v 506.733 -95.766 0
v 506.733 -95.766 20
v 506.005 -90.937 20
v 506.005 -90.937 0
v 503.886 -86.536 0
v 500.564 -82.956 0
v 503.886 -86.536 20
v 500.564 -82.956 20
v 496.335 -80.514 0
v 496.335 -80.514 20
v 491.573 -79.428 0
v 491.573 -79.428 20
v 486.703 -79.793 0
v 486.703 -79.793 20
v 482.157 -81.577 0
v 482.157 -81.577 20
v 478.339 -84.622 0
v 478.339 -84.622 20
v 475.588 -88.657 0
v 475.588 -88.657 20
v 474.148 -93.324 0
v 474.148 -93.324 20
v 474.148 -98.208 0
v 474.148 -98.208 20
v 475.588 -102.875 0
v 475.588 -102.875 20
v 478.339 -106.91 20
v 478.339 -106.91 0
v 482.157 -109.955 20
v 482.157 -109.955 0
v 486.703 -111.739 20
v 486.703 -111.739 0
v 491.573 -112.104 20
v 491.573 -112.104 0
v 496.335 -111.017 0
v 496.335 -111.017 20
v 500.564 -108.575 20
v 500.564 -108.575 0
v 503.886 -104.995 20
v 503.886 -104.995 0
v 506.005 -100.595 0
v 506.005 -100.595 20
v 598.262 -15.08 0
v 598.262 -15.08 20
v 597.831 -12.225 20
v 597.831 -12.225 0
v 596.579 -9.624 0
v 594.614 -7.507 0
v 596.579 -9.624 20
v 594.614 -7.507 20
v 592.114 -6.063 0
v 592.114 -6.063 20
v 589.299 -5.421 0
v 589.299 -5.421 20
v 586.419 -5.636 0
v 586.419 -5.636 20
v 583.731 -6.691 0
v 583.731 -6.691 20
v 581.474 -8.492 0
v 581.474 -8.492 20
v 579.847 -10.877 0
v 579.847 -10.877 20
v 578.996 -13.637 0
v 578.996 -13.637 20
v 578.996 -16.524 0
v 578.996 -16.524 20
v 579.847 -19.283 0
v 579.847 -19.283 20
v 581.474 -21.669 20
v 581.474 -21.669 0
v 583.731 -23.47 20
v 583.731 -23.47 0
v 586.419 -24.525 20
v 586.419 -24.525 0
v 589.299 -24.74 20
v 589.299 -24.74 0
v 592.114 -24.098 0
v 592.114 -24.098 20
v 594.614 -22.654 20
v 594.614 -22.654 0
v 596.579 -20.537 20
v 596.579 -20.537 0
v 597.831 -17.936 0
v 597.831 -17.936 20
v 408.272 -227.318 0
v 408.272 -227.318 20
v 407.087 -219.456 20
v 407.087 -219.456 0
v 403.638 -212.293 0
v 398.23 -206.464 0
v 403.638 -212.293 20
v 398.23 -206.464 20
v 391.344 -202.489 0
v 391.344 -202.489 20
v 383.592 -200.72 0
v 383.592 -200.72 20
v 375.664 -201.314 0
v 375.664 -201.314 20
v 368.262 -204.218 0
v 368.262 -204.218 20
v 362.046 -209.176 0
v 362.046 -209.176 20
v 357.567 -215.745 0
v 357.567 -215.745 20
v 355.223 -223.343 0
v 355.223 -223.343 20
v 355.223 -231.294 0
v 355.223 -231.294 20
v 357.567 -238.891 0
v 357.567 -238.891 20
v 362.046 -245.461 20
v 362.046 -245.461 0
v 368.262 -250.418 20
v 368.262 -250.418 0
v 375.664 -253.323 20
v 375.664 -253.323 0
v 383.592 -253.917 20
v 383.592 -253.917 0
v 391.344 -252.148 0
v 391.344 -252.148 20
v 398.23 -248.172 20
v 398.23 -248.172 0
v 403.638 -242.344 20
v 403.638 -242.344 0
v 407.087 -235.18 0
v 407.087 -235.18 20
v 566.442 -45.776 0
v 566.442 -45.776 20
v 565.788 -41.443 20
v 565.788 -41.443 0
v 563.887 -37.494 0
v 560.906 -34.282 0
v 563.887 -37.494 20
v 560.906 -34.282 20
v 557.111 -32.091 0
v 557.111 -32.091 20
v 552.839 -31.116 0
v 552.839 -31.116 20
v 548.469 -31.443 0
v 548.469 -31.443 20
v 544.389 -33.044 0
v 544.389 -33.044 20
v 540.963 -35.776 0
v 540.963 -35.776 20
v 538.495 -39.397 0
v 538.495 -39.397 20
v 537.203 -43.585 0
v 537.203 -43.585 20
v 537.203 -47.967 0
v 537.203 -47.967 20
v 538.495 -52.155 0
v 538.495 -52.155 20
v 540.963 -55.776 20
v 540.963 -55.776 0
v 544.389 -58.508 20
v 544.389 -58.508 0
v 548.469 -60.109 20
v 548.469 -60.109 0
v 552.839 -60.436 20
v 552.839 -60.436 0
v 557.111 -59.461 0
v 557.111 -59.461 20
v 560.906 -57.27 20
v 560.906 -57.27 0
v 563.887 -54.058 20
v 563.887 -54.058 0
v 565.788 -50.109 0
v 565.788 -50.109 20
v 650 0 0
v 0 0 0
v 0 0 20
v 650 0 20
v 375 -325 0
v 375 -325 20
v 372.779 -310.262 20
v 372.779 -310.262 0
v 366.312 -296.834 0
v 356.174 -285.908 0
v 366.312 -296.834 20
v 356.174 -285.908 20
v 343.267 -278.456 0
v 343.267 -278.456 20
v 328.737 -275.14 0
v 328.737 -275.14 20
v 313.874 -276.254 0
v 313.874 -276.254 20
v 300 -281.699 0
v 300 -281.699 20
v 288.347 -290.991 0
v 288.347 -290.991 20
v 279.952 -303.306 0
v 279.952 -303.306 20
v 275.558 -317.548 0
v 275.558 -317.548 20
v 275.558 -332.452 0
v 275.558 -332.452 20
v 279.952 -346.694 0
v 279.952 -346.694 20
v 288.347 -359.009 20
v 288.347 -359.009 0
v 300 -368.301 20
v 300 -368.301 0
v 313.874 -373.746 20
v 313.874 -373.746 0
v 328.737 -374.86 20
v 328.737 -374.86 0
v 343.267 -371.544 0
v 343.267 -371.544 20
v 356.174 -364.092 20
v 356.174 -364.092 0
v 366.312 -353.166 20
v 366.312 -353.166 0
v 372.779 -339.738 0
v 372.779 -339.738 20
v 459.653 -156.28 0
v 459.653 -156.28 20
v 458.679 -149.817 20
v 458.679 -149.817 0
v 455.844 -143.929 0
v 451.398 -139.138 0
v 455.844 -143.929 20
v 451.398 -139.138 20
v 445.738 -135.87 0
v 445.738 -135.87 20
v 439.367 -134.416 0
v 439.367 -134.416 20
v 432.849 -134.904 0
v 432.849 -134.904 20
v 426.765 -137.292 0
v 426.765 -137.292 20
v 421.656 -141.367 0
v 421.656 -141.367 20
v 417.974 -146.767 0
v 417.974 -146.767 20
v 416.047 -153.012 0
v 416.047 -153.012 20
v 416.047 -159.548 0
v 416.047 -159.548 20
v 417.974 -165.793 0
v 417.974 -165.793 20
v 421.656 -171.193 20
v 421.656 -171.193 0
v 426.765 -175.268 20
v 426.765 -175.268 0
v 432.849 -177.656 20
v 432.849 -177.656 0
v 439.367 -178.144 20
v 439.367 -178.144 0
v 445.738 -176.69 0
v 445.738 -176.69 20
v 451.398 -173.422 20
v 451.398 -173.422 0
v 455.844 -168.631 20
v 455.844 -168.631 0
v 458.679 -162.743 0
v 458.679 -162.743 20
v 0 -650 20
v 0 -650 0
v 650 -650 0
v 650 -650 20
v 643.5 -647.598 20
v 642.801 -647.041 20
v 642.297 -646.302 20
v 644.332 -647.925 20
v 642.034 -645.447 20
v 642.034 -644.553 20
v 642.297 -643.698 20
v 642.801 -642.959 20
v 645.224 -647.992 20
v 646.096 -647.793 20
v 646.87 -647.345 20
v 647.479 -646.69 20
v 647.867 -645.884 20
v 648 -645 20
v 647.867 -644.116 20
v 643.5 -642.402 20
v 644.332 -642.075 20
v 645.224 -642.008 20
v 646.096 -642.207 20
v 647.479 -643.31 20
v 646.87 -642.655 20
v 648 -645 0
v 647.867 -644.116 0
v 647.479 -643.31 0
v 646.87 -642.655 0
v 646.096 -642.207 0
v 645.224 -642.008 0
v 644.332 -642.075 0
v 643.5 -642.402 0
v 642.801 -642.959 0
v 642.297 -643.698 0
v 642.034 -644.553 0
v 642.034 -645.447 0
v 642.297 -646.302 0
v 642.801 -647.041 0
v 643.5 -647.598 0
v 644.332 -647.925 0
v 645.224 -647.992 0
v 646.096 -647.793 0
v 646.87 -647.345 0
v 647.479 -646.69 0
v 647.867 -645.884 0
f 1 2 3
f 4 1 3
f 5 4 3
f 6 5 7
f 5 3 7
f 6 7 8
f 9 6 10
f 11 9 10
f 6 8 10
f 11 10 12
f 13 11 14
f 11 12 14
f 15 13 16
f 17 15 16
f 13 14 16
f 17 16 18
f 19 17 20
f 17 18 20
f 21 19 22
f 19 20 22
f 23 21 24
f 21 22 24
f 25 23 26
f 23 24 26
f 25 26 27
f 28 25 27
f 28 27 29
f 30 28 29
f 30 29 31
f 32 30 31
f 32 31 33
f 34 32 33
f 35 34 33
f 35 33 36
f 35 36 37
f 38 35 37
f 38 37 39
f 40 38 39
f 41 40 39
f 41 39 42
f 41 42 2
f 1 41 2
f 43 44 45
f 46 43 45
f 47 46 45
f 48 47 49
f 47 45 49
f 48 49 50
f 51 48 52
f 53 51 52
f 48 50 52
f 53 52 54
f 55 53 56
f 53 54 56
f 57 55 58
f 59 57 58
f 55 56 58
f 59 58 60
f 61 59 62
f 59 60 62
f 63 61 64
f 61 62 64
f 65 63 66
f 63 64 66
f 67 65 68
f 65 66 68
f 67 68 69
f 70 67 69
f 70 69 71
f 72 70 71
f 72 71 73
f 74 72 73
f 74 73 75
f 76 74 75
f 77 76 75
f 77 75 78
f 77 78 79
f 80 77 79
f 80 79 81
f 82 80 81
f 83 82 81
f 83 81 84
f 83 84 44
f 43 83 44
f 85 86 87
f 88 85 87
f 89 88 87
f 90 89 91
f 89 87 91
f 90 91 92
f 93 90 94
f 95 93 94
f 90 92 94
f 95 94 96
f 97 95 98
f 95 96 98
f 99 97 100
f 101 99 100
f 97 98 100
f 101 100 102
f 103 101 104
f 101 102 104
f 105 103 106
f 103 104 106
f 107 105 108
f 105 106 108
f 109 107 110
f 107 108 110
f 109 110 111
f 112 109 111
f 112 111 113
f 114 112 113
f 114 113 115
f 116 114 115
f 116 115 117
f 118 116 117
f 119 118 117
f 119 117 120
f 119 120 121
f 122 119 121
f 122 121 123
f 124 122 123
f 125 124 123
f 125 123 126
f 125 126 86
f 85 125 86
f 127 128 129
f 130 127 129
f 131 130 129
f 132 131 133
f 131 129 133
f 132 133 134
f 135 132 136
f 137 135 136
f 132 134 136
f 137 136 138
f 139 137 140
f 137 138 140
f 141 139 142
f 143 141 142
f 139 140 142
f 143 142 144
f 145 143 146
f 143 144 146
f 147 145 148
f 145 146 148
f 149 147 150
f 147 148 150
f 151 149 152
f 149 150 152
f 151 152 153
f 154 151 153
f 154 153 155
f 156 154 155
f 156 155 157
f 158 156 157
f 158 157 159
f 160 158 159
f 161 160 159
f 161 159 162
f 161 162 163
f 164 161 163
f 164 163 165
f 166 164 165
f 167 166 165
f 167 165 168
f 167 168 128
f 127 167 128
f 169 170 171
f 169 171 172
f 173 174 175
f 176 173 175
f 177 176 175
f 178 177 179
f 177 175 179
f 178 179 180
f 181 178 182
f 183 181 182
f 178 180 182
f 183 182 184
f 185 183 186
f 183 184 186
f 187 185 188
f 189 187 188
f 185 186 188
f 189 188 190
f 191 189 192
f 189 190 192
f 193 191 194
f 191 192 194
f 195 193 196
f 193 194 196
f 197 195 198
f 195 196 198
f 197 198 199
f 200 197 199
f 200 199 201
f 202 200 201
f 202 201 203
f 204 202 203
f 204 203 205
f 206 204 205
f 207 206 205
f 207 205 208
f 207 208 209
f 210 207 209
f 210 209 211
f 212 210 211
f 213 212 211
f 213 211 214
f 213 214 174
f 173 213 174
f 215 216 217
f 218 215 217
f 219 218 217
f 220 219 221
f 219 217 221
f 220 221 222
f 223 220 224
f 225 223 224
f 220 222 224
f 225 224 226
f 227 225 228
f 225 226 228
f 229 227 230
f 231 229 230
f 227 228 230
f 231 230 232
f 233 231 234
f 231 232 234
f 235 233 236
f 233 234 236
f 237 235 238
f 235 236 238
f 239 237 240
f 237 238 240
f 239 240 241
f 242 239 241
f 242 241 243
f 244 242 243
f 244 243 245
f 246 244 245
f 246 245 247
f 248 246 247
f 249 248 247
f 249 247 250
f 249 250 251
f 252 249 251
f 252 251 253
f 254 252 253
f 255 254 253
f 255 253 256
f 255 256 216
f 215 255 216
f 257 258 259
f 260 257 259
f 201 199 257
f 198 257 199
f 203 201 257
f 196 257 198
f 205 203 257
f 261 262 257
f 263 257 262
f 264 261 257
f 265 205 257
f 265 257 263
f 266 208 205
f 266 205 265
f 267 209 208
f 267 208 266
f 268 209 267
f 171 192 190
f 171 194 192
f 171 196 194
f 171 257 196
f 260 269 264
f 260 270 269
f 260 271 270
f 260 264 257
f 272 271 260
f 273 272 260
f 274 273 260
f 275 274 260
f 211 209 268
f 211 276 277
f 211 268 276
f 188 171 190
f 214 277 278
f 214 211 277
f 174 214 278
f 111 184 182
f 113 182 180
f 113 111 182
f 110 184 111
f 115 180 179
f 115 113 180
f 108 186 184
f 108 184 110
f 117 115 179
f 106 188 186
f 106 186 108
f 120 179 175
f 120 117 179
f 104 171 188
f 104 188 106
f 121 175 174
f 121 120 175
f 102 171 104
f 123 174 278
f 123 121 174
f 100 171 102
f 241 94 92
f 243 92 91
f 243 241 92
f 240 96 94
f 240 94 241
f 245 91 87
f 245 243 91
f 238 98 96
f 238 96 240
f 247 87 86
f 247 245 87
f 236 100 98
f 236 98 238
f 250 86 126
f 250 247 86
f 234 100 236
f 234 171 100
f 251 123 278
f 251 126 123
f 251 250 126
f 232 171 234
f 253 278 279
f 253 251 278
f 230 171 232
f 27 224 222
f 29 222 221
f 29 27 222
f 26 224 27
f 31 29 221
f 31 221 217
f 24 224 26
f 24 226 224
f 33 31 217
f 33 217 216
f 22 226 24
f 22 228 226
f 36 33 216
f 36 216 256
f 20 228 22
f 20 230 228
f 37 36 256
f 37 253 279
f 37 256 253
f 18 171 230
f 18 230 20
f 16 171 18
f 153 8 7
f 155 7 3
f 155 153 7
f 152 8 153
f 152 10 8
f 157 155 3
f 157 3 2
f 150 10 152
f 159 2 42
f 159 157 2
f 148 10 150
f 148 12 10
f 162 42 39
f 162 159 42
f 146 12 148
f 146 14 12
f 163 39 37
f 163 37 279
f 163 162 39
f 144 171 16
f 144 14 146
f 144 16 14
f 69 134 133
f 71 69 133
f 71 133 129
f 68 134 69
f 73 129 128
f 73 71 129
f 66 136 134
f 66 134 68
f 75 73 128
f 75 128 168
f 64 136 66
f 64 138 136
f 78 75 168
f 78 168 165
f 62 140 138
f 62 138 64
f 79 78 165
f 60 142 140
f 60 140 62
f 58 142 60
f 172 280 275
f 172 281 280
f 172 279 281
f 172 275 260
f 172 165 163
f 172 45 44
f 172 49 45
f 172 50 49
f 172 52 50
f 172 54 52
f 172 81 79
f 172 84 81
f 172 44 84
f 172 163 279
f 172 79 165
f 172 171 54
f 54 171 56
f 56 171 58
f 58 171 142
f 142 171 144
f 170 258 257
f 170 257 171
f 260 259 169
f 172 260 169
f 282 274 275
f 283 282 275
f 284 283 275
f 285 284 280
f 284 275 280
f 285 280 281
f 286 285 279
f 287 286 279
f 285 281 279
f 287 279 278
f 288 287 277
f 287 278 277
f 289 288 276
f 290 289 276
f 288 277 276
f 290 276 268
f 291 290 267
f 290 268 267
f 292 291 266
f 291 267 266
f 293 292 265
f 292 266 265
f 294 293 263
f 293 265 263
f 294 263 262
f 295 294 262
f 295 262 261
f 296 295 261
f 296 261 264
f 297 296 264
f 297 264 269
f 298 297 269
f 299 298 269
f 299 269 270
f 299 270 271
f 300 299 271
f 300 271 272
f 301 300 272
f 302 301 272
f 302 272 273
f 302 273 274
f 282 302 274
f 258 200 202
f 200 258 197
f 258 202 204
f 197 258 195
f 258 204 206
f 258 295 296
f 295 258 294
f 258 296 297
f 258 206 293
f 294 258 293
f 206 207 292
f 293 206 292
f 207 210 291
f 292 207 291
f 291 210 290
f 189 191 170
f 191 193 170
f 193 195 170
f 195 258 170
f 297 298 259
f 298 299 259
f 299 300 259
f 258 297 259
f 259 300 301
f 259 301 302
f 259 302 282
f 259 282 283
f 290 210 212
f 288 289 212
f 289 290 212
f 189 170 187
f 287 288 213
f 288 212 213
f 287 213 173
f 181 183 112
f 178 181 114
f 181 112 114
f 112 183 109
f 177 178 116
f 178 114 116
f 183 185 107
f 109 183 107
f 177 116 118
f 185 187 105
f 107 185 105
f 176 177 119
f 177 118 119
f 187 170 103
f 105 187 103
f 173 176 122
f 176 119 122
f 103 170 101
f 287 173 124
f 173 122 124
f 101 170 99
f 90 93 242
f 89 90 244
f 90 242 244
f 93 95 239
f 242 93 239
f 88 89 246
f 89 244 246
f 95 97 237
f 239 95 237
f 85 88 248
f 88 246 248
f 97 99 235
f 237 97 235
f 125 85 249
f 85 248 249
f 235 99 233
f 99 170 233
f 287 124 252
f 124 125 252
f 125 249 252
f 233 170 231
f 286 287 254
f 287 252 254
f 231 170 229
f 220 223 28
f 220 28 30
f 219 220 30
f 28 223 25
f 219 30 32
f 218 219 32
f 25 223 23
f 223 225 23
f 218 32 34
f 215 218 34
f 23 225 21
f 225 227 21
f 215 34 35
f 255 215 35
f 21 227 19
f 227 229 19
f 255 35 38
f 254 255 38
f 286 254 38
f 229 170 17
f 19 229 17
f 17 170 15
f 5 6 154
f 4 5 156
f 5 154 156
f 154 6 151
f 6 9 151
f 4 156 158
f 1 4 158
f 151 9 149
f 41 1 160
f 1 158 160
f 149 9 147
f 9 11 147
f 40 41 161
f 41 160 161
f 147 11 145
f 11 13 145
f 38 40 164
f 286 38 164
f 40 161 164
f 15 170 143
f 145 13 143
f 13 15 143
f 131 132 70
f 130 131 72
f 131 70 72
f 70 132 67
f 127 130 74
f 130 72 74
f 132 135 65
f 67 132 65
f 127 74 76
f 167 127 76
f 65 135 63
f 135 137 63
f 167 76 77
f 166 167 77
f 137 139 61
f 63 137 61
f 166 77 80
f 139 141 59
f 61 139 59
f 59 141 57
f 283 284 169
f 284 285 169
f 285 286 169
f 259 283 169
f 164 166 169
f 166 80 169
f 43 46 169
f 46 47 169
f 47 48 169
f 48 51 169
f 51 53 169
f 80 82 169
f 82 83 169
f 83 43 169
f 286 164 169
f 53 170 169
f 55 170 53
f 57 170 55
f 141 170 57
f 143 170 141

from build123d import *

# Parameters (mm, degrees)
F0_W       = 650
F0_H       = 650
F1_DEPTH   = 20
F2_R       = 50
F3_DEPTH   = 25
F4_R       = 26.673415
F9_DEPTH   = 25
F5_R       = 21.925408
F10_DEPTH  = 25
F6_R       = 16.384006
F11_DEPTH  = 25
F7_R       = 14.701481
F12_DEPTH  = 25
F8_R       = 9.686961
F13_DEPTH  = 25
F11_FACE_R = 16.384006
F14_DEPTH  = 50
F15_R      = 3
F16_DEPTH  = 25


with BuildPart() as f1:
    # F0 (on Top) → F1 (new body)
    with BuildSketch(Plane.XY):
        with Locations((325, -325)):
            Rectangle(F0_W, F0_H)
    extrude(amount=F1_DEPTH)

    # F2 (on face) → F3 (cut)
    with BuildSketch(Plane.XY.offset(20)):
        with Locations((325, -325)):
            Circle(F2_R)
    extrude(amount=-F3_DEPTH, mode=Mode.SUBTRACT)

    # F4 (on face) → F9 (cut)
    with BuildSketch(Plane.XY.offset(20)):
        with Locations((381.598979, -227.318332)):
            Circle(F4_R)
    extrude(amount=-F9_DEPTH, mode=Mode.SUBTRACT)

    # F5 (on face) → F10 (cut)
    with BuildSketch(Plane.XY.offset(20)):
        with Locations((437.728018, -156.280026)):
            Circle(F5_R)
    extrude(amount=-F10_DEPTH, mode=Mode.SUBTRACT)

    # F6 (on face) → F11 (join)
    with BuildSketch(Plane.XY.offset(20)):
        with Locations((490.348995, -95.765911)):
            Circle(F6_R)
    extrude(amount=F11_DEPTH)

    # F7 (on face) → F12 (cut)
    with BuildSketch(Plane.XY.offset(20)):
        with Locations((551.74011, -45.775995)):
            Circle(F7_R)
    extrude(amount=-F12_DEPTH, mode=Mode.SUBTRACT)

    # F8 (on face) → F13 (cut)
    with BuildSketch(Plane.XY.offset(20)):
        with Locations((588.574767, -15.080438)):
            Circle(F8_R)
    extrude(amount=-F13_DEPTH, mode=Mode.SUBTRACT)

    # F11_face (on face) → F14 (cut)
    with BuildSketch(Plane(origin=(490.348995, -95.765911, 45), x_dir=(1, 0, 0), z_dir=(0, 0, 1))):
        Circle(F11_FACE_R)
    extrude(amount=-F14_DEPTH, mode=Mode.SUBTRACT)

    # F15 (on face) → F16 (cut)
    with BuildSketch(Plane.XY.offset(20)):
        with Locations((645, -645)):
            Circle(F15_R)
    extrude(amount=-F16_DEPTH, mode=Mode.SUBTRACT)


solid = f1.part
